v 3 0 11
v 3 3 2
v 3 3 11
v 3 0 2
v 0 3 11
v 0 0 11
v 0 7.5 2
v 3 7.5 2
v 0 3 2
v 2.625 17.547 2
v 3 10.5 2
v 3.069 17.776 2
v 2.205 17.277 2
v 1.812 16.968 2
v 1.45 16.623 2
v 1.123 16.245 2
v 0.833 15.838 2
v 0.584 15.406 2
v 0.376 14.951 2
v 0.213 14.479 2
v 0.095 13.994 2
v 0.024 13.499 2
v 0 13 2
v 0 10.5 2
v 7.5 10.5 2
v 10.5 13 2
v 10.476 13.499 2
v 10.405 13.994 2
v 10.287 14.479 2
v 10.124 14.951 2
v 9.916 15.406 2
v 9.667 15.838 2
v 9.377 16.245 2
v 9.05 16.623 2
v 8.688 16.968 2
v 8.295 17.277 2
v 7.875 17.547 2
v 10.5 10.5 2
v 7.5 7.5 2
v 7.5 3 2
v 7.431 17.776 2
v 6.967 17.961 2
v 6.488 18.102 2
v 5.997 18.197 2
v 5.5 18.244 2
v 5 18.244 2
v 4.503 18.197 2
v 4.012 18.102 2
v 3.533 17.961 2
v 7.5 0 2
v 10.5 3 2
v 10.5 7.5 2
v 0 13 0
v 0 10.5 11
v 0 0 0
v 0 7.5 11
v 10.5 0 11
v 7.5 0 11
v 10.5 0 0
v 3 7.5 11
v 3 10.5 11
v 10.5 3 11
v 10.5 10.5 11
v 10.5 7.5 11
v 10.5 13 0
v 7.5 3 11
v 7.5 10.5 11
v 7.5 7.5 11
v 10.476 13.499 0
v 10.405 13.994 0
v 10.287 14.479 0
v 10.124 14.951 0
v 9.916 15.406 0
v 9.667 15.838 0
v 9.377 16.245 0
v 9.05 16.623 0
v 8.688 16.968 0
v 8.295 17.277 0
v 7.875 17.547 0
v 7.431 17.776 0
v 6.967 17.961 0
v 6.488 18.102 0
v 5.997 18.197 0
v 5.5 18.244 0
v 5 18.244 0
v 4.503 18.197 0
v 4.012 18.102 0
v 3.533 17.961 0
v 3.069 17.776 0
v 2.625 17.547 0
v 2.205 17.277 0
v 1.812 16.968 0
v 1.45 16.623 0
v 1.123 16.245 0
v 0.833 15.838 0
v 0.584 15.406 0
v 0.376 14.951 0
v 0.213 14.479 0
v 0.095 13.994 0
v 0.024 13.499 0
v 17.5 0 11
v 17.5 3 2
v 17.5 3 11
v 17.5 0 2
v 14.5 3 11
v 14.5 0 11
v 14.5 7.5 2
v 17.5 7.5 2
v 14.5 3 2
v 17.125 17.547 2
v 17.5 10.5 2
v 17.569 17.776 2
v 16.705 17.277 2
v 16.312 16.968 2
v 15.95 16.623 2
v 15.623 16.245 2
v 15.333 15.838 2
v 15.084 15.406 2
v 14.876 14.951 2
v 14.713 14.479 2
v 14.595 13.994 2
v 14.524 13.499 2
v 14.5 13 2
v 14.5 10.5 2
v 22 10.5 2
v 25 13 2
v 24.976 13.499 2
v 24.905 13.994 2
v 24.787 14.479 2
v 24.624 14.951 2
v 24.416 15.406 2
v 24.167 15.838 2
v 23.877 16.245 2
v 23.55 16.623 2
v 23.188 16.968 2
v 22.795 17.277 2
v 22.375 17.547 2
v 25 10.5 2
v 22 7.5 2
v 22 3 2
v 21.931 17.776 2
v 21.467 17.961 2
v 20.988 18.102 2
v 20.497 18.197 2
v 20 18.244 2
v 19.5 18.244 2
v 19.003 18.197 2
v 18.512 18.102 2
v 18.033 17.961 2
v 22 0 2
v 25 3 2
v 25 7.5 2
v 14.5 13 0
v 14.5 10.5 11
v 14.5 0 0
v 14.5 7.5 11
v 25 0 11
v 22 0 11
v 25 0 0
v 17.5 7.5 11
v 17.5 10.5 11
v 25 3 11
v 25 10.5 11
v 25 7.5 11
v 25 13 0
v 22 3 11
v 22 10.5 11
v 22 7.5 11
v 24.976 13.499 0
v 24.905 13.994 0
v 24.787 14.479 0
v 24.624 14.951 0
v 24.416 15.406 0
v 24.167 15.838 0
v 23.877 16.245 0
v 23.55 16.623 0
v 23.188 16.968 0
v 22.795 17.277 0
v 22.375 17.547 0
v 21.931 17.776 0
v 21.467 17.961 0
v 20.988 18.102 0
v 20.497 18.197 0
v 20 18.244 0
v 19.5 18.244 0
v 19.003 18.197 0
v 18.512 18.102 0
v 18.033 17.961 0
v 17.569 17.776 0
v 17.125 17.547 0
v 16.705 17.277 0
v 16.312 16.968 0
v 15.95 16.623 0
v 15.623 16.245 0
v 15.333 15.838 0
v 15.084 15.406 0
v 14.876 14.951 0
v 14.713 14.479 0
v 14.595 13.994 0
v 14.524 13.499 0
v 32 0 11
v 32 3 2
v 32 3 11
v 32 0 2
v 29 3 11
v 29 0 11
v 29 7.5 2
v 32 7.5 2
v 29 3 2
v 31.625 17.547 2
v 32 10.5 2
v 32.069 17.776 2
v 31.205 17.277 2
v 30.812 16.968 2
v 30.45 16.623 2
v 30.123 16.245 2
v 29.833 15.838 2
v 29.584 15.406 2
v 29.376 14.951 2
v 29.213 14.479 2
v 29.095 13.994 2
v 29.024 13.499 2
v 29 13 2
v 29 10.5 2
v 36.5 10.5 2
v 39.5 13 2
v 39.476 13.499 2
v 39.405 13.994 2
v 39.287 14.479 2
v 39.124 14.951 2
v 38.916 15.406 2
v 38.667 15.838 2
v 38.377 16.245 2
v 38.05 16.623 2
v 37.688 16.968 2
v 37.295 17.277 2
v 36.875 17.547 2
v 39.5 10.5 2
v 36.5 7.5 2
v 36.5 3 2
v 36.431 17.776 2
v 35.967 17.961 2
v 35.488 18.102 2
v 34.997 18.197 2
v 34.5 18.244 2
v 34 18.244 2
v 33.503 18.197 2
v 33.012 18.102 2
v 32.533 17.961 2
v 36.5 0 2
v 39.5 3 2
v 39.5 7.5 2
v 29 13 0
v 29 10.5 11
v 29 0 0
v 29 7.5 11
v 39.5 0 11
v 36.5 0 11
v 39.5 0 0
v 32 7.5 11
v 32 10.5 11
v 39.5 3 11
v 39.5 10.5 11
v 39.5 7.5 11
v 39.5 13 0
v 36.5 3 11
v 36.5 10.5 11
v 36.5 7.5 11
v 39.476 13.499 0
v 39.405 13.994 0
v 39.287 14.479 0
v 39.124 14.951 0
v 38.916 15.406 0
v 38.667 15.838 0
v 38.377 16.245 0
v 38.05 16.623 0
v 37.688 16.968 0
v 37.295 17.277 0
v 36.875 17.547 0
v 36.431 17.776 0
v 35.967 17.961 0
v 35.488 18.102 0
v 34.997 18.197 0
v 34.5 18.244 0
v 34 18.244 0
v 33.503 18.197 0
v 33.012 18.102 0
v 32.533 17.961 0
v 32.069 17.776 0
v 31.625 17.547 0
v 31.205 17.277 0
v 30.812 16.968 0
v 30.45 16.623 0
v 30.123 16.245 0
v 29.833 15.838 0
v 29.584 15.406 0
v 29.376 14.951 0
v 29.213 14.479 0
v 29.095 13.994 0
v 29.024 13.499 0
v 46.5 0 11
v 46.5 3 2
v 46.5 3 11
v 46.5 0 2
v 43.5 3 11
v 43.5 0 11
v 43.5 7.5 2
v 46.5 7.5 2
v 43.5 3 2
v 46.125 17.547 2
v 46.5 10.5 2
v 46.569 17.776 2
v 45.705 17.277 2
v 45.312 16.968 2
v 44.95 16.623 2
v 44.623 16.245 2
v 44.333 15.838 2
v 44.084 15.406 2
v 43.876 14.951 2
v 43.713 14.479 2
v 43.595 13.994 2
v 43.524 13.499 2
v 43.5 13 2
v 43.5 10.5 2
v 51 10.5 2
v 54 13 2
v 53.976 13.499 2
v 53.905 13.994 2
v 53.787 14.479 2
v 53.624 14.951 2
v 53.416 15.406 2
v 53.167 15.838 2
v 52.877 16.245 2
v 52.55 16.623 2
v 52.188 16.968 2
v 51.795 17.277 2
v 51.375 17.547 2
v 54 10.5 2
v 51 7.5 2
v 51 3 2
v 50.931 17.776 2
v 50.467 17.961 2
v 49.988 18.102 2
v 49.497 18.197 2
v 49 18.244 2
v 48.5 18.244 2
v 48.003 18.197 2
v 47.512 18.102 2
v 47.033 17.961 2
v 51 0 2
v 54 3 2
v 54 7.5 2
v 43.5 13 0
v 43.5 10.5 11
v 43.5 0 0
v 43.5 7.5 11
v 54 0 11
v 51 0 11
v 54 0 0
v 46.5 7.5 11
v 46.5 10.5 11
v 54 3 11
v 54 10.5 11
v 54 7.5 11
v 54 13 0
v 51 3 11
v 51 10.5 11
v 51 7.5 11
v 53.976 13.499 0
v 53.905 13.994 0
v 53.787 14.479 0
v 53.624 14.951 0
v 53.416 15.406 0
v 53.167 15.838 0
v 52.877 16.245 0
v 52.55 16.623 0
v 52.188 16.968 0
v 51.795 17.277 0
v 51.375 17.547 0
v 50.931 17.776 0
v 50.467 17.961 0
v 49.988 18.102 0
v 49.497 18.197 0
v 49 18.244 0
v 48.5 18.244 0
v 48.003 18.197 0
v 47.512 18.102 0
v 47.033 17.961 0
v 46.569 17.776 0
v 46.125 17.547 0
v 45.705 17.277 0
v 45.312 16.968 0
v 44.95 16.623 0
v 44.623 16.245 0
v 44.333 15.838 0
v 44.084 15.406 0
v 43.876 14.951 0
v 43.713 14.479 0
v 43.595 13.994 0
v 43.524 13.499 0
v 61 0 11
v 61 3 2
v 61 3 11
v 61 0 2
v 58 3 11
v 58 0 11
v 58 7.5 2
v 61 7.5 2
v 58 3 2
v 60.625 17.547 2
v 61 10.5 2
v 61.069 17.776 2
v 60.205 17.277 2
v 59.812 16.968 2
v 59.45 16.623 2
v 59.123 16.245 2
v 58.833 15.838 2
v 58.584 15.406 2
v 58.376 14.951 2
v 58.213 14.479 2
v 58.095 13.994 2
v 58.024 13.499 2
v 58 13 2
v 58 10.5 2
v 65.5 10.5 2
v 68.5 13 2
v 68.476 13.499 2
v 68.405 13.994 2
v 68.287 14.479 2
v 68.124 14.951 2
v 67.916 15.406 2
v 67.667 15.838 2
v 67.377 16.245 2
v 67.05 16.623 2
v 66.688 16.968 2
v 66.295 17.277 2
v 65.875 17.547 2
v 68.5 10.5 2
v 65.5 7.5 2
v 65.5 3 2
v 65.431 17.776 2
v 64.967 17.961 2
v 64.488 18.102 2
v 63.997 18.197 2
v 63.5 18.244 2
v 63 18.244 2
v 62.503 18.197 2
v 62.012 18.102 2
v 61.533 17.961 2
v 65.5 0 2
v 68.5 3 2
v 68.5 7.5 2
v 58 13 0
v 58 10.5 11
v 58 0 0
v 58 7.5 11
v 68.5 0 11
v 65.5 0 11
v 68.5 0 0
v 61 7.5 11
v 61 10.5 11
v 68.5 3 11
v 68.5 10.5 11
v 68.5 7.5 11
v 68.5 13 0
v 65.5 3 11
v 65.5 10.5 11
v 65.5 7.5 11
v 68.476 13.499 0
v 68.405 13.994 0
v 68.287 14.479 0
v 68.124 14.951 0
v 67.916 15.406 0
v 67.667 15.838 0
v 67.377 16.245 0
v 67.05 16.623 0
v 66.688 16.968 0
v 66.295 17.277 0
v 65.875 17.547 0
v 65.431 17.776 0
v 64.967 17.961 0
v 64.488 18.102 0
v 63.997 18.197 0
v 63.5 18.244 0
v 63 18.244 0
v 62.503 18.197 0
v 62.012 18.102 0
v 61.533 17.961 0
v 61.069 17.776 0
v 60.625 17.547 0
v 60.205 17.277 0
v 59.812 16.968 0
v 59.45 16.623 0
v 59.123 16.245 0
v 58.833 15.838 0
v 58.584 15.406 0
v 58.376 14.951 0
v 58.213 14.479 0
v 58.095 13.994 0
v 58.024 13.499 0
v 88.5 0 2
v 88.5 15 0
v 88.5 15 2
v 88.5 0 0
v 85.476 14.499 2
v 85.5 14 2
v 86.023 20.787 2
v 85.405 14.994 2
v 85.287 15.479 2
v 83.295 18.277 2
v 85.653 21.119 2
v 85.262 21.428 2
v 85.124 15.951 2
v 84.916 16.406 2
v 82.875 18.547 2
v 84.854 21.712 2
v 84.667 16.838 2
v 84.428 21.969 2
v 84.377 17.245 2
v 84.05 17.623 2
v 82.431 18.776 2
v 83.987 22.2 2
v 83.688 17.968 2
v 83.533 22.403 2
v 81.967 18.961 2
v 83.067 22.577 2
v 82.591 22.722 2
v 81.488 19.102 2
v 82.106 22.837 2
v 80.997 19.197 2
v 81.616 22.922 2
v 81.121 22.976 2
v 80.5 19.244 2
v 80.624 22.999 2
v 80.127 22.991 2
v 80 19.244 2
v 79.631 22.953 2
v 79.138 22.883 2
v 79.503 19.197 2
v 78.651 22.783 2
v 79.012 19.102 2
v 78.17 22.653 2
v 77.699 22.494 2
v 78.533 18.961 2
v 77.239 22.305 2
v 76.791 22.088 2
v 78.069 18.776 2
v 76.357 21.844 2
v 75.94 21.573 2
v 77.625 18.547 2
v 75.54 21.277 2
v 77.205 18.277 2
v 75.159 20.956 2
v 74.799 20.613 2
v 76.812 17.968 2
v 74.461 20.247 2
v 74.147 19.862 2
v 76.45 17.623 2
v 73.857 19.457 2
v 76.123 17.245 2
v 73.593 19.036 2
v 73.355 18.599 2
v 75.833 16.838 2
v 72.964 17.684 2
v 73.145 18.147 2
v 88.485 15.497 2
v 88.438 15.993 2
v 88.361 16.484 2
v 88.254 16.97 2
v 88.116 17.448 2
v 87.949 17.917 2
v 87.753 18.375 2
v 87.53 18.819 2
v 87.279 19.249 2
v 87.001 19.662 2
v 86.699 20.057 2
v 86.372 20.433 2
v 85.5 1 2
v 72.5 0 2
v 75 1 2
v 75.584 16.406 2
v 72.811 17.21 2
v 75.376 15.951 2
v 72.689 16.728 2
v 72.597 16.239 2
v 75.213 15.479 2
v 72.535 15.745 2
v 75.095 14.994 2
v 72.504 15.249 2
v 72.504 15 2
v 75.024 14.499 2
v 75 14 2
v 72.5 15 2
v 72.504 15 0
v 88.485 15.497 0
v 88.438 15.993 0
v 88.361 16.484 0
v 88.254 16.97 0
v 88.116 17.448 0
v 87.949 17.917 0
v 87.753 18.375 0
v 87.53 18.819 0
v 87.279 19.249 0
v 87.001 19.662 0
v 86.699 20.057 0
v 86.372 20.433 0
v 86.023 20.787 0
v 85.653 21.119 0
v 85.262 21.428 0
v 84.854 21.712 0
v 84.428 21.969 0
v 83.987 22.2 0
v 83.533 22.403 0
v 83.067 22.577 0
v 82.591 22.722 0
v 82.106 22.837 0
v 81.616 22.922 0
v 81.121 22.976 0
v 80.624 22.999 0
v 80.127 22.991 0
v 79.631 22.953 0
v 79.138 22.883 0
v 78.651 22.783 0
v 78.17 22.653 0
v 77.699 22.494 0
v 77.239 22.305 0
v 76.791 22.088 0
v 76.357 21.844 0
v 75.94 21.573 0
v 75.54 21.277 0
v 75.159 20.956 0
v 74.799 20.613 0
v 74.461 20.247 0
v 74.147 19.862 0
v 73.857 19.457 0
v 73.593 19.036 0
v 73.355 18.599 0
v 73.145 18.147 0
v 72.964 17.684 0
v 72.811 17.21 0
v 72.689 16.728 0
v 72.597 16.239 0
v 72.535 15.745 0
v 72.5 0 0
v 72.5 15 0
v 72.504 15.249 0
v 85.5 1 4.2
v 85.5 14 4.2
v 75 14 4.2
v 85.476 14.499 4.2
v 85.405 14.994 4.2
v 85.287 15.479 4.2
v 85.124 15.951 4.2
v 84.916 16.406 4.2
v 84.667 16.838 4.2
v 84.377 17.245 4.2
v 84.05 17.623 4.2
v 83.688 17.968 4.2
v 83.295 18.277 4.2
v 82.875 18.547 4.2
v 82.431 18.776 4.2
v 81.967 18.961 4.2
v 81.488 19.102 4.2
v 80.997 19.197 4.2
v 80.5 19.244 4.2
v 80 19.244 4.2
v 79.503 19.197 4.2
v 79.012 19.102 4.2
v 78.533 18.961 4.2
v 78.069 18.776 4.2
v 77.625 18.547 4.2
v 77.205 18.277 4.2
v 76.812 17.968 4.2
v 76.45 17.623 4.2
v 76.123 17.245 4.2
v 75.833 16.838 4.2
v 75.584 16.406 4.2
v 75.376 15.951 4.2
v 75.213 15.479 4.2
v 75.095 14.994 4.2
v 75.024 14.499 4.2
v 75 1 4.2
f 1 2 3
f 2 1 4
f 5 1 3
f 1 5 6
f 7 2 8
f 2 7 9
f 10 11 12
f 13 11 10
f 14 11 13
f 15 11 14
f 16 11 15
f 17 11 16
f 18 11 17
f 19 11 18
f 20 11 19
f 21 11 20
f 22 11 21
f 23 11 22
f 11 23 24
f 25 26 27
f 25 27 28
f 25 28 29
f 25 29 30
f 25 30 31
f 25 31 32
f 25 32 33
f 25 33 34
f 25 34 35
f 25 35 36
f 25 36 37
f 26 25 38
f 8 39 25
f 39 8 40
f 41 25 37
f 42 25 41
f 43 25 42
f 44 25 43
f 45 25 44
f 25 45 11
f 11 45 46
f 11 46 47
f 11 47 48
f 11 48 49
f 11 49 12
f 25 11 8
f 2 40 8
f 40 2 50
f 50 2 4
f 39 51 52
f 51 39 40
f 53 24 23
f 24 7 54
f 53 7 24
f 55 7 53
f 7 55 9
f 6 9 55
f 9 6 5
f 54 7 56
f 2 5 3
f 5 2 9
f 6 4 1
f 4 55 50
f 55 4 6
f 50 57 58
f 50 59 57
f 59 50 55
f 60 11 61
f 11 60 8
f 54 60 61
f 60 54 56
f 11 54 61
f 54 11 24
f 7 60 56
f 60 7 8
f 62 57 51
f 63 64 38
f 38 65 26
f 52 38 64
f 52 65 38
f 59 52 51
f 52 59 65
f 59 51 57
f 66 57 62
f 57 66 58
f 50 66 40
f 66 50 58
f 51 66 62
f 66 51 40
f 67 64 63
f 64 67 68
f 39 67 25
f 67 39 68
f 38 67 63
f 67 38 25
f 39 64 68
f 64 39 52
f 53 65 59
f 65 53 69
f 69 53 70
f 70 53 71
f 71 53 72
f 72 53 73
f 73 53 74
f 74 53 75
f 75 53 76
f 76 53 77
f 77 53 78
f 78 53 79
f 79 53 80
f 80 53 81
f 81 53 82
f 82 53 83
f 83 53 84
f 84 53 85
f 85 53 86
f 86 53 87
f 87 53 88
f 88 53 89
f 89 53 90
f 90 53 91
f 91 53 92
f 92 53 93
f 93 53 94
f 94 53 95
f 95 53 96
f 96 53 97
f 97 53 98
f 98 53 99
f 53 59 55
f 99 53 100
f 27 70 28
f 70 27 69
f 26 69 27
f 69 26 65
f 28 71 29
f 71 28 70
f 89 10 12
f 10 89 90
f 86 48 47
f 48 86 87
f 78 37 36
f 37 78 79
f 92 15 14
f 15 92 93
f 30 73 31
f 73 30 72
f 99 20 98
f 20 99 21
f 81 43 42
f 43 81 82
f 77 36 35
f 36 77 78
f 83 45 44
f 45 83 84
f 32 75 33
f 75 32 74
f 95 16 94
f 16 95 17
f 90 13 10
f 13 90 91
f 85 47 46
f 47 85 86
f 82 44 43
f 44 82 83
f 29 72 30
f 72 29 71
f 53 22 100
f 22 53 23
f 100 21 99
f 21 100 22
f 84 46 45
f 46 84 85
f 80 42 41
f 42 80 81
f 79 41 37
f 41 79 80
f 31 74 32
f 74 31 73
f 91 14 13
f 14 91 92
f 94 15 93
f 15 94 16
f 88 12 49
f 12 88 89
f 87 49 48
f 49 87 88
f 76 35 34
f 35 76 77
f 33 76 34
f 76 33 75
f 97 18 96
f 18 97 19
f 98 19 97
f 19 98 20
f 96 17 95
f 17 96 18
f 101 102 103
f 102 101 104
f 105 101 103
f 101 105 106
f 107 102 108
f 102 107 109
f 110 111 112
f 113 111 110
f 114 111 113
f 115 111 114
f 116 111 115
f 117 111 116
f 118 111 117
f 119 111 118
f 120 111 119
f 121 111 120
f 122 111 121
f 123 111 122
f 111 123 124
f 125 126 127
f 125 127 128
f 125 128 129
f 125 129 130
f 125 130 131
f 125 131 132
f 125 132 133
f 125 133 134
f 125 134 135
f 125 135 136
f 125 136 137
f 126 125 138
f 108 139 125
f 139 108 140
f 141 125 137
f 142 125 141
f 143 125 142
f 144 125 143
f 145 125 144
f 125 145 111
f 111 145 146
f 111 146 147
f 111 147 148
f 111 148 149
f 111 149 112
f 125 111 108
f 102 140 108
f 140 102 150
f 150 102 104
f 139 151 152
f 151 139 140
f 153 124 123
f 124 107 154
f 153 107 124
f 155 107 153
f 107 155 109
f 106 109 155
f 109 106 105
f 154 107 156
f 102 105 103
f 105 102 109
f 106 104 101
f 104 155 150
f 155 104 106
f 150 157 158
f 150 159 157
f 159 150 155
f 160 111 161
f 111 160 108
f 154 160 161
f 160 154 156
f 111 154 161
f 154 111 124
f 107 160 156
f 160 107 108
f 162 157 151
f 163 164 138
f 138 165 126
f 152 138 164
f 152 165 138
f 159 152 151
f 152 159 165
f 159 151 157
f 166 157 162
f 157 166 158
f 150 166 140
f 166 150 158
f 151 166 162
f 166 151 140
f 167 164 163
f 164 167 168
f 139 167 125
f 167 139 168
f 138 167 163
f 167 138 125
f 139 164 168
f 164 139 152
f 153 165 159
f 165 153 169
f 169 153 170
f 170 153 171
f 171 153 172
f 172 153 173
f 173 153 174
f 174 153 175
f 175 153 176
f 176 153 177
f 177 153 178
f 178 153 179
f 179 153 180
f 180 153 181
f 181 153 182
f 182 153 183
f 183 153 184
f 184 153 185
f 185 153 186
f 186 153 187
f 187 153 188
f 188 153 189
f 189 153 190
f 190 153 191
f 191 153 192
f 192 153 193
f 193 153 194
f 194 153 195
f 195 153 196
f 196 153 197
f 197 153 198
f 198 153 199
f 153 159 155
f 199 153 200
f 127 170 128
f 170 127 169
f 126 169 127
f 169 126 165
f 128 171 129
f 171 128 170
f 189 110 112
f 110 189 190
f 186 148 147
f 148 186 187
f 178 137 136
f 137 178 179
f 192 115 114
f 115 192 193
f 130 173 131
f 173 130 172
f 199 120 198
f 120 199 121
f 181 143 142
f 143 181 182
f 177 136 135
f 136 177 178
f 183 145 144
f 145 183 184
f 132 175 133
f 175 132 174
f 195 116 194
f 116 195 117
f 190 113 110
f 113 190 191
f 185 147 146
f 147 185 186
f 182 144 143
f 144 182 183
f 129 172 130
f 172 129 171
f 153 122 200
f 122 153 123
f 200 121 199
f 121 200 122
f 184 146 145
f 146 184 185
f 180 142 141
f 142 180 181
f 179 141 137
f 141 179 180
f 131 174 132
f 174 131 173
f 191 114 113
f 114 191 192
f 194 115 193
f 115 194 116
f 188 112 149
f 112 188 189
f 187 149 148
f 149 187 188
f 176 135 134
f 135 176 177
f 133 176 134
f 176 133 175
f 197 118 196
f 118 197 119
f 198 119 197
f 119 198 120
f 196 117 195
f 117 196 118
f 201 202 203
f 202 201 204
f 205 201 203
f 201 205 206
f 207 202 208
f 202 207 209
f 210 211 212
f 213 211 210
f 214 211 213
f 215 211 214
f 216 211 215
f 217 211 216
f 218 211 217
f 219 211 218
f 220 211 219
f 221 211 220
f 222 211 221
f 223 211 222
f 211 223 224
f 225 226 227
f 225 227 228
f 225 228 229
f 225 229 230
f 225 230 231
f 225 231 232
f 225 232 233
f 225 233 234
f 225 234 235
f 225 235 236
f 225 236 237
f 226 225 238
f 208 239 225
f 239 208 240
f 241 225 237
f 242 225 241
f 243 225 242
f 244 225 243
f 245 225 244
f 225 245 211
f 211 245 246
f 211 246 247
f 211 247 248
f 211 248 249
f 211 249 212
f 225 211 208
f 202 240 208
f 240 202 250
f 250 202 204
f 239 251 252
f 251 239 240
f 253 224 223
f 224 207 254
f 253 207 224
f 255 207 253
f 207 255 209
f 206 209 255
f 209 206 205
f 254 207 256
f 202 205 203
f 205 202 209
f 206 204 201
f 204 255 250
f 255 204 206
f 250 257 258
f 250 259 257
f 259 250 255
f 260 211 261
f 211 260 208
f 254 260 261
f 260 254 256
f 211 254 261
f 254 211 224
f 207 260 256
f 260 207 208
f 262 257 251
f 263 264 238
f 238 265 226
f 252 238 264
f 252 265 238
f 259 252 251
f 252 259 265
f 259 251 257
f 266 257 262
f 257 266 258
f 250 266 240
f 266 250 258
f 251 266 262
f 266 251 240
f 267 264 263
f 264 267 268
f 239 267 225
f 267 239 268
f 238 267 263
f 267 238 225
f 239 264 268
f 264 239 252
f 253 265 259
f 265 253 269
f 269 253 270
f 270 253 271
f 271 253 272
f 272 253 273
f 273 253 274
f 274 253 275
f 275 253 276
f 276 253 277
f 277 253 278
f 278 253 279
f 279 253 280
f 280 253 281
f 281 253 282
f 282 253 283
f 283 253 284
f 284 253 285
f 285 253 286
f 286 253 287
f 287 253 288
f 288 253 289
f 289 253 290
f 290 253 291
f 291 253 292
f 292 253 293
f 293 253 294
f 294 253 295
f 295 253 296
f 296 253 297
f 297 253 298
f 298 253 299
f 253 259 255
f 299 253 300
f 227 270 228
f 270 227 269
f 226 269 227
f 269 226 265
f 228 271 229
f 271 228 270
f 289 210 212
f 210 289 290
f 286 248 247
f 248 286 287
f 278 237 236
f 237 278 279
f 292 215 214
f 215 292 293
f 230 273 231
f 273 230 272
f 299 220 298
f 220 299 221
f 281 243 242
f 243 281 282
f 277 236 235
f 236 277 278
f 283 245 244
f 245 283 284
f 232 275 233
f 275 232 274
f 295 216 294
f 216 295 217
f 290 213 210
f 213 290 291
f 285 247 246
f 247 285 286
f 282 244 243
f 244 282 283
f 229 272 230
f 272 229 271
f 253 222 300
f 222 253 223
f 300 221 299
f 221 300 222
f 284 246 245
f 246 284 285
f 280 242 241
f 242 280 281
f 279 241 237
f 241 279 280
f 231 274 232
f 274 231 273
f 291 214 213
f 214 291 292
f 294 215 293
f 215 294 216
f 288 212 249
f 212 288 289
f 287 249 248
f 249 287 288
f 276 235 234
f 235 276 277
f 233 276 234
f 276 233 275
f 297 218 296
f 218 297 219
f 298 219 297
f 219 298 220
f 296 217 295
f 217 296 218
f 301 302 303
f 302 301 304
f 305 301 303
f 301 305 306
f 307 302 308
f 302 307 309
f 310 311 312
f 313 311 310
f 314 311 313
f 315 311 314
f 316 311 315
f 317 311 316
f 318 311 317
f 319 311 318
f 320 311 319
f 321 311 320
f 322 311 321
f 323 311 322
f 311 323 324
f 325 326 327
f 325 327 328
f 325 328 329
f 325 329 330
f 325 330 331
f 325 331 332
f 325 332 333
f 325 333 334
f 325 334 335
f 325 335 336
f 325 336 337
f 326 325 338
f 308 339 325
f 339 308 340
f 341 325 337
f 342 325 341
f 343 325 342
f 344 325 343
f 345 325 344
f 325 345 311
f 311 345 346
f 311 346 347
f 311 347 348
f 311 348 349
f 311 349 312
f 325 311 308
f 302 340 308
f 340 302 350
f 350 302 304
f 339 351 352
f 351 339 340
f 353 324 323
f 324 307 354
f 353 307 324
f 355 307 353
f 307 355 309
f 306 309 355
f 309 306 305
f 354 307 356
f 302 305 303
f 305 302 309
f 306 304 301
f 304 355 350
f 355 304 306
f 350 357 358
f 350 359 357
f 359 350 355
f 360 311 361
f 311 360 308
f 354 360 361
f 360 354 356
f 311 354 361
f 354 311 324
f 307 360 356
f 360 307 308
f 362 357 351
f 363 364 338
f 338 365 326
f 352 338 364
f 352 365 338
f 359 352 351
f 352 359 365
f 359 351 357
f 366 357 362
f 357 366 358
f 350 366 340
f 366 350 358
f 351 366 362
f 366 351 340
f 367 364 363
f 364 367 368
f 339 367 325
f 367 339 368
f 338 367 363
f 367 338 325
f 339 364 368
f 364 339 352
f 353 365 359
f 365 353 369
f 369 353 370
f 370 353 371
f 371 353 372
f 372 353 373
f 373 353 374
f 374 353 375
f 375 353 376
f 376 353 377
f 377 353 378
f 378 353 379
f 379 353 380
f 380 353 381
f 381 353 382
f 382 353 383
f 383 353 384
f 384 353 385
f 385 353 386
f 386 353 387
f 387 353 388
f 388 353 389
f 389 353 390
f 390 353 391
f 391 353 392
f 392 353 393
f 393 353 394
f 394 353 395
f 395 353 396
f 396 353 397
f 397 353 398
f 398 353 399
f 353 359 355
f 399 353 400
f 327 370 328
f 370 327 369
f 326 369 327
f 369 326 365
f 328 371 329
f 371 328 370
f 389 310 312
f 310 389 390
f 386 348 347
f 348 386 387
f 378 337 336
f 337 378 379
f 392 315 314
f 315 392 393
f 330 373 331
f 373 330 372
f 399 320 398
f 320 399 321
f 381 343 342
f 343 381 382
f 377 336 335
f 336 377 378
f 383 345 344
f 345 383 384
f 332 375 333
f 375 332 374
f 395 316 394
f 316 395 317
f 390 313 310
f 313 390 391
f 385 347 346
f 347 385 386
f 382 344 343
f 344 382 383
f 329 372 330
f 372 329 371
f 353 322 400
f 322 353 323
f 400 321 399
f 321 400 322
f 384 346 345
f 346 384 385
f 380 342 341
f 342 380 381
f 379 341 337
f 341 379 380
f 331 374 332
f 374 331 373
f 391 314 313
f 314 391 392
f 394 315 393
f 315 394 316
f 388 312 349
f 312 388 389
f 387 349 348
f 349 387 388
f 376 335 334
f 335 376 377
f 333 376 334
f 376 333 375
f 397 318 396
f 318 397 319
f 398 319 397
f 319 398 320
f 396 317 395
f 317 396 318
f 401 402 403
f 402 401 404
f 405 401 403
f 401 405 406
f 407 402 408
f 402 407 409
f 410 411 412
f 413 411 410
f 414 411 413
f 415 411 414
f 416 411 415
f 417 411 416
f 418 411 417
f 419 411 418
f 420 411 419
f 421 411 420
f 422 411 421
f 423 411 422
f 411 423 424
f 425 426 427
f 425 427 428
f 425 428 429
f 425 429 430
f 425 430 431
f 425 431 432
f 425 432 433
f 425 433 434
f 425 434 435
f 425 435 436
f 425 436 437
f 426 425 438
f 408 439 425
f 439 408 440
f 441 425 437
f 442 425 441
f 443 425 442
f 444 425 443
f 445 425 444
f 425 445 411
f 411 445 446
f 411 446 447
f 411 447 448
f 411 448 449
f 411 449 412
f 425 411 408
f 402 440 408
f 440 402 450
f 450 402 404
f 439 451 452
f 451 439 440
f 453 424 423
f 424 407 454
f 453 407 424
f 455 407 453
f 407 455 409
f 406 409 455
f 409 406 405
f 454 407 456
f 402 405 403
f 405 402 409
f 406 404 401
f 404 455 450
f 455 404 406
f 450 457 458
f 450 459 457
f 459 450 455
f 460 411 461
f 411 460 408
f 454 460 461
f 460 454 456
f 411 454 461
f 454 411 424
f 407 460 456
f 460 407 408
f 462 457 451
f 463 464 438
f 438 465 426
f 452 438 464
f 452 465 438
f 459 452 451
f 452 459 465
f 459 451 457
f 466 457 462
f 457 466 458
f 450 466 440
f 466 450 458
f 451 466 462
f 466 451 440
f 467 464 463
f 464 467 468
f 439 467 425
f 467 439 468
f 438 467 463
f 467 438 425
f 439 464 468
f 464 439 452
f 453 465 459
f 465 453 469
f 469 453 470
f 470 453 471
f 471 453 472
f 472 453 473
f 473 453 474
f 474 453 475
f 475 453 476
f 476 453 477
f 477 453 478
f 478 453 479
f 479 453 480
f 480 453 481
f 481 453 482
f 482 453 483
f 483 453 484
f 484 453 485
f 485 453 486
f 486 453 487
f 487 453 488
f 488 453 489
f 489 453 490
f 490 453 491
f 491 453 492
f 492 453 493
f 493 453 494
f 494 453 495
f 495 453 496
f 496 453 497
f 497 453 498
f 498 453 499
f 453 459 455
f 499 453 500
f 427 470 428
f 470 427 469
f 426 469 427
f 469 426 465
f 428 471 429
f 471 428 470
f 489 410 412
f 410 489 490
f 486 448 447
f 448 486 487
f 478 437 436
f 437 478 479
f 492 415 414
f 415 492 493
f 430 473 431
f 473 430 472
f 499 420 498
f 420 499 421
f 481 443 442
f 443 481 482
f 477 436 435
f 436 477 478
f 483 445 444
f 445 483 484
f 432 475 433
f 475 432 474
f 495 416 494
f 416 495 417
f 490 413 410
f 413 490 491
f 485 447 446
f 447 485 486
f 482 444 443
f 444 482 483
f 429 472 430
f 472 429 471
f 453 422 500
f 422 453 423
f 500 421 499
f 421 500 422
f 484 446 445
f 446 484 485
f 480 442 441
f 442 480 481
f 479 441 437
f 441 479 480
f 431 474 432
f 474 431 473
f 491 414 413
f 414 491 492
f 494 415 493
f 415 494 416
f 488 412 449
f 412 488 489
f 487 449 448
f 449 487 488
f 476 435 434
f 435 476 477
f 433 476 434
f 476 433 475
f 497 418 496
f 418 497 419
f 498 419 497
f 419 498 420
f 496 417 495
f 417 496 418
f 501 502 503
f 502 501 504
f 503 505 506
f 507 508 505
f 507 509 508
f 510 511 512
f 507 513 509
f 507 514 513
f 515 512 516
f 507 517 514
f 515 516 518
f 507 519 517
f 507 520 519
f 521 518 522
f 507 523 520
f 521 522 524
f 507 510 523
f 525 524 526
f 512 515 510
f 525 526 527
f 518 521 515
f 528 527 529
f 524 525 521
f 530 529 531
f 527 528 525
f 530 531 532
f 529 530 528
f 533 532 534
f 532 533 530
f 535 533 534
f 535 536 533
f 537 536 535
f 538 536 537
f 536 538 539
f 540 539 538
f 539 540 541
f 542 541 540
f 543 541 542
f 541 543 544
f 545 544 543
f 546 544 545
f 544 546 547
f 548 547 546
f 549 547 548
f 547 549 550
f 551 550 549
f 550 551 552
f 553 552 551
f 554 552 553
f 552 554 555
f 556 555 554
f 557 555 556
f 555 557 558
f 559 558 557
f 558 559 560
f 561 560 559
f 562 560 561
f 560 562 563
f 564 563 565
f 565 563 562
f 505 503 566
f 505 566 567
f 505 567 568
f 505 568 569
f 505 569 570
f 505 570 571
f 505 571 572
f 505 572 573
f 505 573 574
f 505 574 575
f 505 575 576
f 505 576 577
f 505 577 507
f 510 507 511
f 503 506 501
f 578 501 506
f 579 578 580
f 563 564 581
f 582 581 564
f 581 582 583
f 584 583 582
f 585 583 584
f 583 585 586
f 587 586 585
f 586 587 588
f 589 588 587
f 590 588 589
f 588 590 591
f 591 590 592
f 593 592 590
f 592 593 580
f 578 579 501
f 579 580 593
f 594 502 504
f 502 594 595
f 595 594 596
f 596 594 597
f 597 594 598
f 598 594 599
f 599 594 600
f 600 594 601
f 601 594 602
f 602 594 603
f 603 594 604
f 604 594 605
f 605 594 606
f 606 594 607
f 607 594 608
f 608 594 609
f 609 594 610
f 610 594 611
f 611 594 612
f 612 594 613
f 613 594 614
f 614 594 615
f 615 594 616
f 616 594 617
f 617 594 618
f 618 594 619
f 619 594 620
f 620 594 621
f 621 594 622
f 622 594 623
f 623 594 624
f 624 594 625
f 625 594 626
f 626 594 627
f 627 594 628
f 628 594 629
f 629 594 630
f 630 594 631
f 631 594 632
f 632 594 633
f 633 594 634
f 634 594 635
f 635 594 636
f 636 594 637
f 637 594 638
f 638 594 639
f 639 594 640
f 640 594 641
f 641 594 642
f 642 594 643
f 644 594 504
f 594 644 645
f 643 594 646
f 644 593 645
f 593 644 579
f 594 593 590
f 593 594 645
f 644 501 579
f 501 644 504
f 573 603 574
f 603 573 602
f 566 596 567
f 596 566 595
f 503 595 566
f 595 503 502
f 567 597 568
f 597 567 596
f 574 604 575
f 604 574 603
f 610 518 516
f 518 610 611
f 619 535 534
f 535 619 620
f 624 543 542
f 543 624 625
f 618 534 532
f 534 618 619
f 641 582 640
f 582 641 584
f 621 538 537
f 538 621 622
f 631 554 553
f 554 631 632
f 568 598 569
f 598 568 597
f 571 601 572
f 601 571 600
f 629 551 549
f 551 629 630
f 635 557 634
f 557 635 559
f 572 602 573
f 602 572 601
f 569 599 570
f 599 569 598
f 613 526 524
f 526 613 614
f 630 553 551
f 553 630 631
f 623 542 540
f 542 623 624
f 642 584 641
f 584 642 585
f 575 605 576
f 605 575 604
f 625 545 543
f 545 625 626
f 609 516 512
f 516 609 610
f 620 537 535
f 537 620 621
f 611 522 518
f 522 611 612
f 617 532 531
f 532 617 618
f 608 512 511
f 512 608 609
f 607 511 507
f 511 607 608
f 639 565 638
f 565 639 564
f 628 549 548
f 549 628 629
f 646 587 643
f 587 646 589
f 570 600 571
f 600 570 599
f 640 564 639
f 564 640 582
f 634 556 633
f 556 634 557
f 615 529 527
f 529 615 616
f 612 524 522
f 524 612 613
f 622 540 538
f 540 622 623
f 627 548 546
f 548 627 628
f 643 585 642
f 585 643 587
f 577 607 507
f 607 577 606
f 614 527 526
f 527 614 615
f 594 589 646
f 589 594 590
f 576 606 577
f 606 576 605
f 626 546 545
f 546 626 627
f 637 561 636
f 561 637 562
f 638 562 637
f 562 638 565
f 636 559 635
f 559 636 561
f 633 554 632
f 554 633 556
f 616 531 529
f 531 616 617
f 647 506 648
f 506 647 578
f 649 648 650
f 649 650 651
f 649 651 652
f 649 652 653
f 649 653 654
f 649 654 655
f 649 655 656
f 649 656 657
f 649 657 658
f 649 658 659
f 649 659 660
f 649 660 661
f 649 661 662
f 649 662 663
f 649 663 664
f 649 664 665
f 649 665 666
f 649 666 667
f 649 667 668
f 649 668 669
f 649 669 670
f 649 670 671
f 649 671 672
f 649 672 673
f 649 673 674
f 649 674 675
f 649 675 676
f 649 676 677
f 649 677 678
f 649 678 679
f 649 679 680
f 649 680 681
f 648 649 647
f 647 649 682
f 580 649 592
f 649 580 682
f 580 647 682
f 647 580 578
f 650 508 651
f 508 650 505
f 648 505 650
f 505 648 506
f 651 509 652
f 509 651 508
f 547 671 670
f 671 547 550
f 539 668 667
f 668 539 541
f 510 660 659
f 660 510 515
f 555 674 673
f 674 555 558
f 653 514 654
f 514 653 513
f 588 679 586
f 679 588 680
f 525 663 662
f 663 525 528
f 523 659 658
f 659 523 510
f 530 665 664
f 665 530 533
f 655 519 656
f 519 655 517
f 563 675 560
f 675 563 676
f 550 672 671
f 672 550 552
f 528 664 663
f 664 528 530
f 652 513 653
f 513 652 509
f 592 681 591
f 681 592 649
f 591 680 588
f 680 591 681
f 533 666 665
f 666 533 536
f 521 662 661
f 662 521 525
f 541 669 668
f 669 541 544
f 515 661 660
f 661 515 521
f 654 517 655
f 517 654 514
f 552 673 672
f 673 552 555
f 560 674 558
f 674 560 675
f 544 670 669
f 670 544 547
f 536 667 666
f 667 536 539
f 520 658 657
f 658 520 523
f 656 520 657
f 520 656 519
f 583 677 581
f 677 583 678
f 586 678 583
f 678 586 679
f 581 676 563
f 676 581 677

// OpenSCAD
//CONFIG
fret_clearance_depth = 2.2; //Clearance required at the back of the fret. Use GHFretClearanceTestingToolGenerator.scad to determine this. Unit = (mm).

generate_setting_tool = true; // Enable the generation of the setting tool. The setting tool is used to ensure you have removed enough material from the fret and the insert is seated to your specified "fret_clearance_depth". If the setting tool does not bottom out on the back of the fret, more material needs to be removed. . Unit = (true/false).

fret_depth = 13.2; //Internal depth  of the fret. The x and y dimensions of standard GH frets differs slightly between models however z appears to consistent. Measure the internal depth of your frets for accuracy. Unit = (mm).

//WHERE THE MAGIC HAPPENS

$fa = 0.5;
$fs = 0.5;
insert_w = 10.5;
insert_l = 13;
leg_w = 3;
leg_l = 3;
part_clearance = 4;
platform_thickness = 2;

for (dx=[0:insert_w+part_clearance:(insert_w+part_clearance)*4]) { //PLATE BUILDER
    translate([dx,0,0]) fret_insert();
        if (dx == (insert_w+part_clearance)*4 && generate_setting_tool){
            translate([dx + (insert_w + part_clearance) ,0,0])setting_tool();
        }
}
module fret_insert() { //insert GENERATOR
    for (xcor=[0:insert_w-leg_w:2*(insert_w-leg_w)-1])
        {
            for (ycor=[0:insert_w-leg_l:(insert_l-leg_l)-1])
                {
                    translate([xcor,ycor,platform_thickness])
                    leg();
        }
    }
        cube([insert_w, insert_l, platform_thickness]);
    translate([insert_w/2,insert_l,0]) cylinder(platform_thickness, insert_w/2, insert_w/2);
}

module leg(){
    leg_height = fret_depth -(fret_clearance_depth + platform_thickness);
    cube([leg_w, leg_l, leg_height]);
}

module setting_tool() { //SETTING TOOL GENERATOR
    cube([16, 15, 2]);
    translate([8,15]) cylinder(2, 8, 8);
    translate([2.5,1,2]) cube([insert_w, insert_l, fret_clearance_depth]);
    translate([(insert_w*0.5)+2.5,(insert_l+1),2]) cylinder(fret_clearance_depth, insert_w*0.5, insert_w*0.5);
}
